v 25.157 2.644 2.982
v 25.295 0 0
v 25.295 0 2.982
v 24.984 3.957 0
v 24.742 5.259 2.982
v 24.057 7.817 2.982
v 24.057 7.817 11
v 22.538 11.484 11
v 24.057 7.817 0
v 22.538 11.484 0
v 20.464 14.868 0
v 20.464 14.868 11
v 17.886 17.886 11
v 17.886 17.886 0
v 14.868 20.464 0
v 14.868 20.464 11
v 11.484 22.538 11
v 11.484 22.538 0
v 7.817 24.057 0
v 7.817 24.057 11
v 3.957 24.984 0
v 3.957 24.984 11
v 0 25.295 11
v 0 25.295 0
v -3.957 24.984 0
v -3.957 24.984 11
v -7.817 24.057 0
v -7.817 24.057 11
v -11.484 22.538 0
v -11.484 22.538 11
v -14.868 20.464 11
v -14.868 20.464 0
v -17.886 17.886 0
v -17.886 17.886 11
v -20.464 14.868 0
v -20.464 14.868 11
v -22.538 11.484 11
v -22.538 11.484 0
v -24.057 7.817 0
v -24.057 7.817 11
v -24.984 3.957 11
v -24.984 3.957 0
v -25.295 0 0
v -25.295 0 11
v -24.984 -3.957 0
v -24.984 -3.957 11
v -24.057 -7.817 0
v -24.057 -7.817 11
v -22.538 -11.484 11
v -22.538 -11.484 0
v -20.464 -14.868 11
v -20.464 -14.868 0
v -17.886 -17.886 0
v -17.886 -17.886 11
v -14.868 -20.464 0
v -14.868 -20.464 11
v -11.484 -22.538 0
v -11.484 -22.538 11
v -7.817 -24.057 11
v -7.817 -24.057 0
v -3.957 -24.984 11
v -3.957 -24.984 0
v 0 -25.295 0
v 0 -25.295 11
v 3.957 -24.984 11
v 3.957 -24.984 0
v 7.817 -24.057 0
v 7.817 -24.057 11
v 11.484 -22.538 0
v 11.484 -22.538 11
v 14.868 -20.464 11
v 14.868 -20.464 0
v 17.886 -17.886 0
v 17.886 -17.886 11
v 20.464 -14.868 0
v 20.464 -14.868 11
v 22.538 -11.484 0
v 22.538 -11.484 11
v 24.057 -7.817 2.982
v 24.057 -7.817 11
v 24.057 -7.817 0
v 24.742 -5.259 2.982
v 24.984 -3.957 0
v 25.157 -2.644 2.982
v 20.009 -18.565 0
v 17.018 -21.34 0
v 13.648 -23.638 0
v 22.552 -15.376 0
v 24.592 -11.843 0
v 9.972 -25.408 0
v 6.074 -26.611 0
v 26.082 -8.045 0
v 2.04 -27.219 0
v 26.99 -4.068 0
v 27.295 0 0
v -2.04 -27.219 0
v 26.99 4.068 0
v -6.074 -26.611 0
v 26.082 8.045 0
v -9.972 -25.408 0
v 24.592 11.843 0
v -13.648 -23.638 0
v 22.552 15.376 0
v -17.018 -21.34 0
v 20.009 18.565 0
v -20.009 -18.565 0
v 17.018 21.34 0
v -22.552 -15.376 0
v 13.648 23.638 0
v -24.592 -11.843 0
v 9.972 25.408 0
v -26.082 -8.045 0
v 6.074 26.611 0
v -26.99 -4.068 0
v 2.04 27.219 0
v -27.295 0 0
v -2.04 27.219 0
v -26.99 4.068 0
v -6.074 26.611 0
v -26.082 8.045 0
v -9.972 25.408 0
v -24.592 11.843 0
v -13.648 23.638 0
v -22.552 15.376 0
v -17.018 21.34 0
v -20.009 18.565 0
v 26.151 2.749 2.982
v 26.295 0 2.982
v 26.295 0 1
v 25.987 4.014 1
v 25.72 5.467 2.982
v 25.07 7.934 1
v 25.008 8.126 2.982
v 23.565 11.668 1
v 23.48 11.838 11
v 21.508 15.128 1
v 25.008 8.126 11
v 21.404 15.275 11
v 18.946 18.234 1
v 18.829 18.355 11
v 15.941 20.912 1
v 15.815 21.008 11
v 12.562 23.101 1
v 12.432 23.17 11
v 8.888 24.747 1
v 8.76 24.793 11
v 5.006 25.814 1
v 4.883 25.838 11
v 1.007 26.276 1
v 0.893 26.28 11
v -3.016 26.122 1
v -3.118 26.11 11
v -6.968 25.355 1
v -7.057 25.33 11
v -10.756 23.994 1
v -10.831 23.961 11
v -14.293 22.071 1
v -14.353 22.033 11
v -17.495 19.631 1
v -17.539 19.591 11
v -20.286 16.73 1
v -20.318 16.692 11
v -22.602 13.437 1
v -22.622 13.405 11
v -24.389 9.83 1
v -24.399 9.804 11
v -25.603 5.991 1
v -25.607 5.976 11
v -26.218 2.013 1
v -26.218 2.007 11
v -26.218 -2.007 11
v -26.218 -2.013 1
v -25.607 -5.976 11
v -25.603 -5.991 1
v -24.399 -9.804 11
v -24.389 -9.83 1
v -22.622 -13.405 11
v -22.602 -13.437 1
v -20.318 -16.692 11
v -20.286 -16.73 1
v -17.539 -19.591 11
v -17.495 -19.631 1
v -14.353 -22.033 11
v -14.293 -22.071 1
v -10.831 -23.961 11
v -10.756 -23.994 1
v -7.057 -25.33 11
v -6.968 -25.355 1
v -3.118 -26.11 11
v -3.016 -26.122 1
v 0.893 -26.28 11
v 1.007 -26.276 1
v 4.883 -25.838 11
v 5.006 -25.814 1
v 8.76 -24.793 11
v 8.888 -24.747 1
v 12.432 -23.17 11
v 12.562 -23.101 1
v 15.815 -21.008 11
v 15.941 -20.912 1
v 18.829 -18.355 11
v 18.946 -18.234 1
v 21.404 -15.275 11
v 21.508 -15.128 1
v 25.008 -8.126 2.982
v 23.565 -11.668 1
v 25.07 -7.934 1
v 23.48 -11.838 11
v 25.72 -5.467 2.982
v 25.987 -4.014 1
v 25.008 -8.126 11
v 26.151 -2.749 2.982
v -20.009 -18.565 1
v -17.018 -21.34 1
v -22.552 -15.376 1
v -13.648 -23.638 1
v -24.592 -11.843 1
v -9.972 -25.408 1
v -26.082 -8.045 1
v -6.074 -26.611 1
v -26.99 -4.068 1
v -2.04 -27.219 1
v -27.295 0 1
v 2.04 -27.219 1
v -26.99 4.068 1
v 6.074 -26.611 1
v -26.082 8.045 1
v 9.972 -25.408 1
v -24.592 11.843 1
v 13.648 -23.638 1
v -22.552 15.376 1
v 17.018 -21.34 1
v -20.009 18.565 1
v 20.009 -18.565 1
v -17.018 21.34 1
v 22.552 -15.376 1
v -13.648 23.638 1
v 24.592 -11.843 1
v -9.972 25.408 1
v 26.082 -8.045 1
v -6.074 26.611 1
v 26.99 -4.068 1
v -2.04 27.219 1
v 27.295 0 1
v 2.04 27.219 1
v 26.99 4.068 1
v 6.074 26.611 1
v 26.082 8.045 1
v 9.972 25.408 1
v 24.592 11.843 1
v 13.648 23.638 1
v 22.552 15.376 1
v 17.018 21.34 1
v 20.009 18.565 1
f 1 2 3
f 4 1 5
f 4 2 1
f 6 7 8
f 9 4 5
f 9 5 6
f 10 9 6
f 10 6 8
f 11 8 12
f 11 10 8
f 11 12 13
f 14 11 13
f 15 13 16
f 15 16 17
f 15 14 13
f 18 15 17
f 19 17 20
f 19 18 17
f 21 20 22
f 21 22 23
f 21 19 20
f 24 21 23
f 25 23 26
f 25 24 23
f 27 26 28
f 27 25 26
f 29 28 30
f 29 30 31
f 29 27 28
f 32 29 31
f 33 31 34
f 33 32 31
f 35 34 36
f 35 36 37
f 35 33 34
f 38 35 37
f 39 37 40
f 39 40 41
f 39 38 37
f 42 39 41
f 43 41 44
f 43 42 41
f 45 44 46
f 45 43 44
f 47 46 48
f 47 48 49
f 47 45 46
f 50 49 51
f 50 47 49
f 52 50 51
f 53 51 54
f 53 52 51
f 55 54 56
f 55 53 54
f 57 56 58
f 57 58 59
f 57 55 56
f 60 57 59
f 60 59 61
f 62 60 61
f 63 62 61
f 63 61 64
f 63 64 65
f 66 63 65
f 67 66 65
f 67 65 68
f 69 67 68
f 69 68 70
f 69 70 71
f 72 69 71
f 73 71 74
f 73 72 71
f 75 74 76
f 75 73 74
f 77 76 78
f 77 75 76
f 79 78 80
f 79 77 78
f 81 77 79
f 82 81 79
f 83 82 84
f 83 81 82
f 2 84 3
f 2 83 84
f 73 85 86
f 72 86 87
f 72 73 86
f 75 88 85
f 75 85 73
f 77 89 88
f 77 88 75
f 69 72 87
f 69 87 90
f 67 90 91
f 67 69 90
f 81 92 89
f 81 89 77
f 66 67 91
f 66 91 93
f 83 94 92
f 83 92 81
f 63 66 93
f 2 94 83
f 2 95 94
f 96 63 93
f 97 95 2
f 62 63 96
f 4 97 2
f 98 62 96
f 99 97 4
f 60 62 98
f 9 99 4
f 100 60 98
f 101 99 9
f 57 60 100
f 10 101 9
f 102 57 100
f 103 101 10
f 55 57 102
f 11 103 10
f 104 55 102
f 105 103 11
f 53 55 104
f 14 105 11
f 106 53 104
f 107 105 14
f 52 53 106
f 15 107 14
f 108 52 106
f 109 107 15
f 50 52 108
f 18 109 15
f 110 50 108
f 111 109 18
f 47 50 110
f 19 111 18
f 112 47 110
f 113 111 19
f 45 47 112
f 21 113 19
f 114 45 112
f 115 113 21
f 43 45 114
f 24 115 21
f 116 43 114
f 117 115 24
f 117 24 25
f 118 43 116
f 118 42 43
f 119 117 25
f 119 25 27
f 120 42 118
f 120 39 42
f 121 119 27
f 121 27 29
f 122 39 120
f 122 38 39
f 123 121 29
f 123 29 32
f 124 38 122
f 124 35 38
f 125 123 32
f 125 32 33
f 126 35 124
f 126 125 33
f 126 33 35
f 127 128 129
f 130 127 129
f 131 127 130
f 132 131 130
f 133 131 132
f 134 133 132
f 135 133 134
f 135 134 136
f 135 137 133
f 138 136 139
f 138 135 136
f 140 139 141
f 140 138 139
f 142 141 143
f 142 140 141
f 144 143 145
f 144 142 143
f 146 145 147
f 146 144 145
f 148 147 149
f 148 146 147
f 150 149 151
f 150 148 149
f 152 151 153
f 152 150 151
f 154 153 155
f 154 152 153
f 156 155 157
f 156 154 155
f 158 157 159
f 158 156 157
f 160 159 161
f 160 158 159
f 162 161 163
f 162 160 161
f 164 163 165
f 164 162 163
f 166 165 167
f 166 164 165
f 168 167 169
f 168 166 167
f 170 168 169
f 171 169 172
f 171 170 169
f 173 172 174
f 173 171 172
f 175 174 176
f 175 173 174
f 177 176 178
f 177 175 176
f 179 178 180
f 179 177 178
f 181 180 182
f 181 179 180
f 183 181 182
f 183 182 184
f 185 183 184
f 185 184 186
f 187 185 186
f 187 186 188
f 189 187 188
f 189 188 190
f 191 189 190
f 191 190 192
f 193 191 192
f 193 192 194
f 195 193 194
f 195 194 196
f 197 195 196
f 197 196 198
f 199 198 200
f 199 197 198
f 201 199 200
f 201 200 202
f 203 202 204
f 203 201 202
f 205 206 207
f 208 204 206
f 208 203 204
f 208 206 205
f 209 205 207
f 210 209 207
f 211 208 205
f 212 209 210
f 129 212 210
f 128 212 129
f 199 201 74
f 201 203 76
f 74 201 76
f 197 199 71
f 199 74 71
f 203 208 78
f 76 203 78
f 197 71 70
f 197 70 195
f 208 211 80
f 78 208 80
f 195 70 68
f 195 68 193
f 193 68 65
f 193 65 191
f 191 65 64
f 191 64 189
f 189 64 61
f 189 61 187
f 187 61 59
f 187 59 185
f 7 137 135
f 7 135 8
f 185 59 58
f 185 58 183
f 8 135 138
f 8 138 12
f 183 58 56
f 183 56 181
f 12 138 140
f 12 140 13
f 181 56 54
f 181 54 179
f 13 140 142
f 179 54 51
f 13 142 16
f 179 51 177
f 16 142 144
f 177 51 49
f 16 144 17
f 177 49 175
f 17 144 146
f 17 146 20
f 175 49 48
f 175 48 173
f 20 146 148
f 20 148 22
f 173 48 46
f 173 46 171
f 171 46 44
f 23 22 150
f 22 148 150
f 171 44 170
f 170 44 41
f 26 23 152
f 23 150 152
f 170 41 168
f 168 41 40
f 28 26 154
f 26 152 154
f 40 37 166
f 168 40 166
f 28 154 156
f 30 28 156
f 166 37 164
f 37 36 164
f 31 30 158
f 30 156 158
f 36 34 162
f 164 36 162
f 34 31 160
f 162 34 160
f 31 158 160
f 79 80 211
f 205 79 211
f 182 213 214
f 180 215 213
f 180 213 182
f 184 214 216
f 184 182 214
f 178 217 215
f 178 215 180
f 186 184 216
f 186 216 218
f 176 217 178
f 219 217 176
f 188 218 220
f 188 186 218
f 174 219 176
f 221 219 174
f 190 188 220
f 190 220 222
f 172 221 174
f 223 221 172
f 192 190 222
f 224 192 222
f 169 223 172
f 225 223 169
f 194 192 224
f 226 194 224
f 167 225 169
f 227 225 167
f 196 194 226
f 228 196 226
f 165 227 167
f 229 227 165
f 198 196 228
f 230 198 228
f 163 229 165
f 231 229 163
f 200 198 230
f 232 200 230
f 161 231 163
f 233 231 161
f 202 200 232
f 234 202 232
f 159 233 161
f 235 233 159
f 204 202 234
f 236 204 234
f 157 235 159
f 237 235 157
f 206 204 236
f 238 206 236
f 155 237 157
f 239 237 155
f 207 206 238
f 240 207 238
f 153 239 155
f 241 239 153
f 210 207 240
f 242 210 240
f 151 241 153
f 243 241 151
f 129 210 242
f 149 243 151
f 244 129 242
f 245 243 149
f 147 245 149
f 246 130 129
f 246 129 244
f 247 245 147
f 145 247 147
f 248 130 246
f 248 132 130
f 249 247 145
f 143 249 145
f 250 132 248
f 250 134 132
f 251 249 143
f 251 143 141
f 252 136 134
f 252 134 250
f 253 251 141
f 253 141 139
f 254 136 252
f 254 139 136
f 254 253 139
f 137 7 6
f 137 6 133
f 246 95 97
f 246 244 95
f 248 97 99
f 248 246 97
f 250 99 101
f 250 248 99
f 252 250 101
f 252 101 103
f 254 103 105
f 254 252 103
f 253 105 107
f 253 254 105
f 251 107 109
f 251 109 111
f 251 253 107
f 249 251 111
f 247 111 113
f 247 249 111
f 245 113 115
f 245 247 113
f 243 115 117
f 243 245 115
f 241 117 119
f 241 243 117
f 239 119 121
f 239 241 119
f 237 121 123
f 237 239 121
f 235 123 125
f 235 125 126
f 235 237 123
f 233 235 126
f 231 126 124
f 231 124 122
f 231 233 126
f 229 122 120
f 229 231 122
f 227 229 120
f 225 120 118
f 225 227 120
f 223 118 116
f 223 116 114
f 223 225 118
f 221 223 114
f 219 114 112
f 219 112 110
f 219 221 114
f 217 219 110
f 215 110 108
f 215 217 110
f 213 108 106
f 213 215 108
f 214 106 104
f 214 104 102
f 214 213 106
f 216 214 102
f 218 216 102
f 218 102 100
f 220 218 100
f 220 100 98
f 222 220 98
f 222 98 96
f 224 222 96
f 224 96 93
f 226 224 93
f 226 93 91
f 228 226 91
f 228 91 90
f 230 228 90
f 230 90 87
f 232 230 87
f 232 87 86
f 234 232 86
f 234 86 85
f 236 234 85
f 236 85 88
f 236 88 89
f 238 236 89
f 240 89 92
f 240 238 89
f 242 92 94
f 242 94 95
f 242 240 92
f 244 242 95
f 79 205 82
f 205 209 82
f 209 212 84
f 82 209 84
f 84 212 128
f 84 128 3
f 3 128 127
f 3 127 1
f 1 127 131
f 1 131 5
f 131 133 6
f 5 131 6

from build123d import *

# Parameters (mm, degrees)
F0_W          = 1
F0_H          = 8.0183284022
F2_ANGLE_BACK = 18
F2_ANGLE      = 36


with BuildPart() as f1:
    # F0 (on Front) → F1 (revolve)
    with BuildSketch(Plane.XZ):
        Polygon((25.295096, 2.9816715978), (25.295096, 0), (27.295096, 0), (27.295096, 1), (26.295096, 1), (26.295096, 2.9816715978), align=None)
        with Locations((25.795096, 6.9908357989)):
            Rectangle(F0_W, F0_H)
    revolve(axis=Axis((0, 0, 8.8810138404), (0, 0, 1)))

    # F0 (on Front) → F2 (revolve, cut)
    with BuildSketch(Plane.XZ, mode=Mode.PRIVATE) as f2_sk:
        Polygon((17.5041668117, 2.9816715978), (25.295096, 2.9816715978), (25.295096, 11), (26.295096, 11), (26.295096, 2.9816715978), (28.2746478915, 2.9816715978), (28.2746478915, 12.9816715978), (17.5041668117, 12.9816715978), align=None)
        with Locations((25.795096, 6.9908357989)):
            Rectangle(F0_W, F0_H)
    revolve(f2_sk.sketch.rotate(Axis((0, 0, 8.8810138404), (0, 0, 1)), -F2_ANGLE_BACK), axis=Axis((0, 0, 8.8810138404), (0, 0, 1)), revolution_arc=F2_ANGLE, mode=Mode.SUBTRACT)


solid = f1.part
